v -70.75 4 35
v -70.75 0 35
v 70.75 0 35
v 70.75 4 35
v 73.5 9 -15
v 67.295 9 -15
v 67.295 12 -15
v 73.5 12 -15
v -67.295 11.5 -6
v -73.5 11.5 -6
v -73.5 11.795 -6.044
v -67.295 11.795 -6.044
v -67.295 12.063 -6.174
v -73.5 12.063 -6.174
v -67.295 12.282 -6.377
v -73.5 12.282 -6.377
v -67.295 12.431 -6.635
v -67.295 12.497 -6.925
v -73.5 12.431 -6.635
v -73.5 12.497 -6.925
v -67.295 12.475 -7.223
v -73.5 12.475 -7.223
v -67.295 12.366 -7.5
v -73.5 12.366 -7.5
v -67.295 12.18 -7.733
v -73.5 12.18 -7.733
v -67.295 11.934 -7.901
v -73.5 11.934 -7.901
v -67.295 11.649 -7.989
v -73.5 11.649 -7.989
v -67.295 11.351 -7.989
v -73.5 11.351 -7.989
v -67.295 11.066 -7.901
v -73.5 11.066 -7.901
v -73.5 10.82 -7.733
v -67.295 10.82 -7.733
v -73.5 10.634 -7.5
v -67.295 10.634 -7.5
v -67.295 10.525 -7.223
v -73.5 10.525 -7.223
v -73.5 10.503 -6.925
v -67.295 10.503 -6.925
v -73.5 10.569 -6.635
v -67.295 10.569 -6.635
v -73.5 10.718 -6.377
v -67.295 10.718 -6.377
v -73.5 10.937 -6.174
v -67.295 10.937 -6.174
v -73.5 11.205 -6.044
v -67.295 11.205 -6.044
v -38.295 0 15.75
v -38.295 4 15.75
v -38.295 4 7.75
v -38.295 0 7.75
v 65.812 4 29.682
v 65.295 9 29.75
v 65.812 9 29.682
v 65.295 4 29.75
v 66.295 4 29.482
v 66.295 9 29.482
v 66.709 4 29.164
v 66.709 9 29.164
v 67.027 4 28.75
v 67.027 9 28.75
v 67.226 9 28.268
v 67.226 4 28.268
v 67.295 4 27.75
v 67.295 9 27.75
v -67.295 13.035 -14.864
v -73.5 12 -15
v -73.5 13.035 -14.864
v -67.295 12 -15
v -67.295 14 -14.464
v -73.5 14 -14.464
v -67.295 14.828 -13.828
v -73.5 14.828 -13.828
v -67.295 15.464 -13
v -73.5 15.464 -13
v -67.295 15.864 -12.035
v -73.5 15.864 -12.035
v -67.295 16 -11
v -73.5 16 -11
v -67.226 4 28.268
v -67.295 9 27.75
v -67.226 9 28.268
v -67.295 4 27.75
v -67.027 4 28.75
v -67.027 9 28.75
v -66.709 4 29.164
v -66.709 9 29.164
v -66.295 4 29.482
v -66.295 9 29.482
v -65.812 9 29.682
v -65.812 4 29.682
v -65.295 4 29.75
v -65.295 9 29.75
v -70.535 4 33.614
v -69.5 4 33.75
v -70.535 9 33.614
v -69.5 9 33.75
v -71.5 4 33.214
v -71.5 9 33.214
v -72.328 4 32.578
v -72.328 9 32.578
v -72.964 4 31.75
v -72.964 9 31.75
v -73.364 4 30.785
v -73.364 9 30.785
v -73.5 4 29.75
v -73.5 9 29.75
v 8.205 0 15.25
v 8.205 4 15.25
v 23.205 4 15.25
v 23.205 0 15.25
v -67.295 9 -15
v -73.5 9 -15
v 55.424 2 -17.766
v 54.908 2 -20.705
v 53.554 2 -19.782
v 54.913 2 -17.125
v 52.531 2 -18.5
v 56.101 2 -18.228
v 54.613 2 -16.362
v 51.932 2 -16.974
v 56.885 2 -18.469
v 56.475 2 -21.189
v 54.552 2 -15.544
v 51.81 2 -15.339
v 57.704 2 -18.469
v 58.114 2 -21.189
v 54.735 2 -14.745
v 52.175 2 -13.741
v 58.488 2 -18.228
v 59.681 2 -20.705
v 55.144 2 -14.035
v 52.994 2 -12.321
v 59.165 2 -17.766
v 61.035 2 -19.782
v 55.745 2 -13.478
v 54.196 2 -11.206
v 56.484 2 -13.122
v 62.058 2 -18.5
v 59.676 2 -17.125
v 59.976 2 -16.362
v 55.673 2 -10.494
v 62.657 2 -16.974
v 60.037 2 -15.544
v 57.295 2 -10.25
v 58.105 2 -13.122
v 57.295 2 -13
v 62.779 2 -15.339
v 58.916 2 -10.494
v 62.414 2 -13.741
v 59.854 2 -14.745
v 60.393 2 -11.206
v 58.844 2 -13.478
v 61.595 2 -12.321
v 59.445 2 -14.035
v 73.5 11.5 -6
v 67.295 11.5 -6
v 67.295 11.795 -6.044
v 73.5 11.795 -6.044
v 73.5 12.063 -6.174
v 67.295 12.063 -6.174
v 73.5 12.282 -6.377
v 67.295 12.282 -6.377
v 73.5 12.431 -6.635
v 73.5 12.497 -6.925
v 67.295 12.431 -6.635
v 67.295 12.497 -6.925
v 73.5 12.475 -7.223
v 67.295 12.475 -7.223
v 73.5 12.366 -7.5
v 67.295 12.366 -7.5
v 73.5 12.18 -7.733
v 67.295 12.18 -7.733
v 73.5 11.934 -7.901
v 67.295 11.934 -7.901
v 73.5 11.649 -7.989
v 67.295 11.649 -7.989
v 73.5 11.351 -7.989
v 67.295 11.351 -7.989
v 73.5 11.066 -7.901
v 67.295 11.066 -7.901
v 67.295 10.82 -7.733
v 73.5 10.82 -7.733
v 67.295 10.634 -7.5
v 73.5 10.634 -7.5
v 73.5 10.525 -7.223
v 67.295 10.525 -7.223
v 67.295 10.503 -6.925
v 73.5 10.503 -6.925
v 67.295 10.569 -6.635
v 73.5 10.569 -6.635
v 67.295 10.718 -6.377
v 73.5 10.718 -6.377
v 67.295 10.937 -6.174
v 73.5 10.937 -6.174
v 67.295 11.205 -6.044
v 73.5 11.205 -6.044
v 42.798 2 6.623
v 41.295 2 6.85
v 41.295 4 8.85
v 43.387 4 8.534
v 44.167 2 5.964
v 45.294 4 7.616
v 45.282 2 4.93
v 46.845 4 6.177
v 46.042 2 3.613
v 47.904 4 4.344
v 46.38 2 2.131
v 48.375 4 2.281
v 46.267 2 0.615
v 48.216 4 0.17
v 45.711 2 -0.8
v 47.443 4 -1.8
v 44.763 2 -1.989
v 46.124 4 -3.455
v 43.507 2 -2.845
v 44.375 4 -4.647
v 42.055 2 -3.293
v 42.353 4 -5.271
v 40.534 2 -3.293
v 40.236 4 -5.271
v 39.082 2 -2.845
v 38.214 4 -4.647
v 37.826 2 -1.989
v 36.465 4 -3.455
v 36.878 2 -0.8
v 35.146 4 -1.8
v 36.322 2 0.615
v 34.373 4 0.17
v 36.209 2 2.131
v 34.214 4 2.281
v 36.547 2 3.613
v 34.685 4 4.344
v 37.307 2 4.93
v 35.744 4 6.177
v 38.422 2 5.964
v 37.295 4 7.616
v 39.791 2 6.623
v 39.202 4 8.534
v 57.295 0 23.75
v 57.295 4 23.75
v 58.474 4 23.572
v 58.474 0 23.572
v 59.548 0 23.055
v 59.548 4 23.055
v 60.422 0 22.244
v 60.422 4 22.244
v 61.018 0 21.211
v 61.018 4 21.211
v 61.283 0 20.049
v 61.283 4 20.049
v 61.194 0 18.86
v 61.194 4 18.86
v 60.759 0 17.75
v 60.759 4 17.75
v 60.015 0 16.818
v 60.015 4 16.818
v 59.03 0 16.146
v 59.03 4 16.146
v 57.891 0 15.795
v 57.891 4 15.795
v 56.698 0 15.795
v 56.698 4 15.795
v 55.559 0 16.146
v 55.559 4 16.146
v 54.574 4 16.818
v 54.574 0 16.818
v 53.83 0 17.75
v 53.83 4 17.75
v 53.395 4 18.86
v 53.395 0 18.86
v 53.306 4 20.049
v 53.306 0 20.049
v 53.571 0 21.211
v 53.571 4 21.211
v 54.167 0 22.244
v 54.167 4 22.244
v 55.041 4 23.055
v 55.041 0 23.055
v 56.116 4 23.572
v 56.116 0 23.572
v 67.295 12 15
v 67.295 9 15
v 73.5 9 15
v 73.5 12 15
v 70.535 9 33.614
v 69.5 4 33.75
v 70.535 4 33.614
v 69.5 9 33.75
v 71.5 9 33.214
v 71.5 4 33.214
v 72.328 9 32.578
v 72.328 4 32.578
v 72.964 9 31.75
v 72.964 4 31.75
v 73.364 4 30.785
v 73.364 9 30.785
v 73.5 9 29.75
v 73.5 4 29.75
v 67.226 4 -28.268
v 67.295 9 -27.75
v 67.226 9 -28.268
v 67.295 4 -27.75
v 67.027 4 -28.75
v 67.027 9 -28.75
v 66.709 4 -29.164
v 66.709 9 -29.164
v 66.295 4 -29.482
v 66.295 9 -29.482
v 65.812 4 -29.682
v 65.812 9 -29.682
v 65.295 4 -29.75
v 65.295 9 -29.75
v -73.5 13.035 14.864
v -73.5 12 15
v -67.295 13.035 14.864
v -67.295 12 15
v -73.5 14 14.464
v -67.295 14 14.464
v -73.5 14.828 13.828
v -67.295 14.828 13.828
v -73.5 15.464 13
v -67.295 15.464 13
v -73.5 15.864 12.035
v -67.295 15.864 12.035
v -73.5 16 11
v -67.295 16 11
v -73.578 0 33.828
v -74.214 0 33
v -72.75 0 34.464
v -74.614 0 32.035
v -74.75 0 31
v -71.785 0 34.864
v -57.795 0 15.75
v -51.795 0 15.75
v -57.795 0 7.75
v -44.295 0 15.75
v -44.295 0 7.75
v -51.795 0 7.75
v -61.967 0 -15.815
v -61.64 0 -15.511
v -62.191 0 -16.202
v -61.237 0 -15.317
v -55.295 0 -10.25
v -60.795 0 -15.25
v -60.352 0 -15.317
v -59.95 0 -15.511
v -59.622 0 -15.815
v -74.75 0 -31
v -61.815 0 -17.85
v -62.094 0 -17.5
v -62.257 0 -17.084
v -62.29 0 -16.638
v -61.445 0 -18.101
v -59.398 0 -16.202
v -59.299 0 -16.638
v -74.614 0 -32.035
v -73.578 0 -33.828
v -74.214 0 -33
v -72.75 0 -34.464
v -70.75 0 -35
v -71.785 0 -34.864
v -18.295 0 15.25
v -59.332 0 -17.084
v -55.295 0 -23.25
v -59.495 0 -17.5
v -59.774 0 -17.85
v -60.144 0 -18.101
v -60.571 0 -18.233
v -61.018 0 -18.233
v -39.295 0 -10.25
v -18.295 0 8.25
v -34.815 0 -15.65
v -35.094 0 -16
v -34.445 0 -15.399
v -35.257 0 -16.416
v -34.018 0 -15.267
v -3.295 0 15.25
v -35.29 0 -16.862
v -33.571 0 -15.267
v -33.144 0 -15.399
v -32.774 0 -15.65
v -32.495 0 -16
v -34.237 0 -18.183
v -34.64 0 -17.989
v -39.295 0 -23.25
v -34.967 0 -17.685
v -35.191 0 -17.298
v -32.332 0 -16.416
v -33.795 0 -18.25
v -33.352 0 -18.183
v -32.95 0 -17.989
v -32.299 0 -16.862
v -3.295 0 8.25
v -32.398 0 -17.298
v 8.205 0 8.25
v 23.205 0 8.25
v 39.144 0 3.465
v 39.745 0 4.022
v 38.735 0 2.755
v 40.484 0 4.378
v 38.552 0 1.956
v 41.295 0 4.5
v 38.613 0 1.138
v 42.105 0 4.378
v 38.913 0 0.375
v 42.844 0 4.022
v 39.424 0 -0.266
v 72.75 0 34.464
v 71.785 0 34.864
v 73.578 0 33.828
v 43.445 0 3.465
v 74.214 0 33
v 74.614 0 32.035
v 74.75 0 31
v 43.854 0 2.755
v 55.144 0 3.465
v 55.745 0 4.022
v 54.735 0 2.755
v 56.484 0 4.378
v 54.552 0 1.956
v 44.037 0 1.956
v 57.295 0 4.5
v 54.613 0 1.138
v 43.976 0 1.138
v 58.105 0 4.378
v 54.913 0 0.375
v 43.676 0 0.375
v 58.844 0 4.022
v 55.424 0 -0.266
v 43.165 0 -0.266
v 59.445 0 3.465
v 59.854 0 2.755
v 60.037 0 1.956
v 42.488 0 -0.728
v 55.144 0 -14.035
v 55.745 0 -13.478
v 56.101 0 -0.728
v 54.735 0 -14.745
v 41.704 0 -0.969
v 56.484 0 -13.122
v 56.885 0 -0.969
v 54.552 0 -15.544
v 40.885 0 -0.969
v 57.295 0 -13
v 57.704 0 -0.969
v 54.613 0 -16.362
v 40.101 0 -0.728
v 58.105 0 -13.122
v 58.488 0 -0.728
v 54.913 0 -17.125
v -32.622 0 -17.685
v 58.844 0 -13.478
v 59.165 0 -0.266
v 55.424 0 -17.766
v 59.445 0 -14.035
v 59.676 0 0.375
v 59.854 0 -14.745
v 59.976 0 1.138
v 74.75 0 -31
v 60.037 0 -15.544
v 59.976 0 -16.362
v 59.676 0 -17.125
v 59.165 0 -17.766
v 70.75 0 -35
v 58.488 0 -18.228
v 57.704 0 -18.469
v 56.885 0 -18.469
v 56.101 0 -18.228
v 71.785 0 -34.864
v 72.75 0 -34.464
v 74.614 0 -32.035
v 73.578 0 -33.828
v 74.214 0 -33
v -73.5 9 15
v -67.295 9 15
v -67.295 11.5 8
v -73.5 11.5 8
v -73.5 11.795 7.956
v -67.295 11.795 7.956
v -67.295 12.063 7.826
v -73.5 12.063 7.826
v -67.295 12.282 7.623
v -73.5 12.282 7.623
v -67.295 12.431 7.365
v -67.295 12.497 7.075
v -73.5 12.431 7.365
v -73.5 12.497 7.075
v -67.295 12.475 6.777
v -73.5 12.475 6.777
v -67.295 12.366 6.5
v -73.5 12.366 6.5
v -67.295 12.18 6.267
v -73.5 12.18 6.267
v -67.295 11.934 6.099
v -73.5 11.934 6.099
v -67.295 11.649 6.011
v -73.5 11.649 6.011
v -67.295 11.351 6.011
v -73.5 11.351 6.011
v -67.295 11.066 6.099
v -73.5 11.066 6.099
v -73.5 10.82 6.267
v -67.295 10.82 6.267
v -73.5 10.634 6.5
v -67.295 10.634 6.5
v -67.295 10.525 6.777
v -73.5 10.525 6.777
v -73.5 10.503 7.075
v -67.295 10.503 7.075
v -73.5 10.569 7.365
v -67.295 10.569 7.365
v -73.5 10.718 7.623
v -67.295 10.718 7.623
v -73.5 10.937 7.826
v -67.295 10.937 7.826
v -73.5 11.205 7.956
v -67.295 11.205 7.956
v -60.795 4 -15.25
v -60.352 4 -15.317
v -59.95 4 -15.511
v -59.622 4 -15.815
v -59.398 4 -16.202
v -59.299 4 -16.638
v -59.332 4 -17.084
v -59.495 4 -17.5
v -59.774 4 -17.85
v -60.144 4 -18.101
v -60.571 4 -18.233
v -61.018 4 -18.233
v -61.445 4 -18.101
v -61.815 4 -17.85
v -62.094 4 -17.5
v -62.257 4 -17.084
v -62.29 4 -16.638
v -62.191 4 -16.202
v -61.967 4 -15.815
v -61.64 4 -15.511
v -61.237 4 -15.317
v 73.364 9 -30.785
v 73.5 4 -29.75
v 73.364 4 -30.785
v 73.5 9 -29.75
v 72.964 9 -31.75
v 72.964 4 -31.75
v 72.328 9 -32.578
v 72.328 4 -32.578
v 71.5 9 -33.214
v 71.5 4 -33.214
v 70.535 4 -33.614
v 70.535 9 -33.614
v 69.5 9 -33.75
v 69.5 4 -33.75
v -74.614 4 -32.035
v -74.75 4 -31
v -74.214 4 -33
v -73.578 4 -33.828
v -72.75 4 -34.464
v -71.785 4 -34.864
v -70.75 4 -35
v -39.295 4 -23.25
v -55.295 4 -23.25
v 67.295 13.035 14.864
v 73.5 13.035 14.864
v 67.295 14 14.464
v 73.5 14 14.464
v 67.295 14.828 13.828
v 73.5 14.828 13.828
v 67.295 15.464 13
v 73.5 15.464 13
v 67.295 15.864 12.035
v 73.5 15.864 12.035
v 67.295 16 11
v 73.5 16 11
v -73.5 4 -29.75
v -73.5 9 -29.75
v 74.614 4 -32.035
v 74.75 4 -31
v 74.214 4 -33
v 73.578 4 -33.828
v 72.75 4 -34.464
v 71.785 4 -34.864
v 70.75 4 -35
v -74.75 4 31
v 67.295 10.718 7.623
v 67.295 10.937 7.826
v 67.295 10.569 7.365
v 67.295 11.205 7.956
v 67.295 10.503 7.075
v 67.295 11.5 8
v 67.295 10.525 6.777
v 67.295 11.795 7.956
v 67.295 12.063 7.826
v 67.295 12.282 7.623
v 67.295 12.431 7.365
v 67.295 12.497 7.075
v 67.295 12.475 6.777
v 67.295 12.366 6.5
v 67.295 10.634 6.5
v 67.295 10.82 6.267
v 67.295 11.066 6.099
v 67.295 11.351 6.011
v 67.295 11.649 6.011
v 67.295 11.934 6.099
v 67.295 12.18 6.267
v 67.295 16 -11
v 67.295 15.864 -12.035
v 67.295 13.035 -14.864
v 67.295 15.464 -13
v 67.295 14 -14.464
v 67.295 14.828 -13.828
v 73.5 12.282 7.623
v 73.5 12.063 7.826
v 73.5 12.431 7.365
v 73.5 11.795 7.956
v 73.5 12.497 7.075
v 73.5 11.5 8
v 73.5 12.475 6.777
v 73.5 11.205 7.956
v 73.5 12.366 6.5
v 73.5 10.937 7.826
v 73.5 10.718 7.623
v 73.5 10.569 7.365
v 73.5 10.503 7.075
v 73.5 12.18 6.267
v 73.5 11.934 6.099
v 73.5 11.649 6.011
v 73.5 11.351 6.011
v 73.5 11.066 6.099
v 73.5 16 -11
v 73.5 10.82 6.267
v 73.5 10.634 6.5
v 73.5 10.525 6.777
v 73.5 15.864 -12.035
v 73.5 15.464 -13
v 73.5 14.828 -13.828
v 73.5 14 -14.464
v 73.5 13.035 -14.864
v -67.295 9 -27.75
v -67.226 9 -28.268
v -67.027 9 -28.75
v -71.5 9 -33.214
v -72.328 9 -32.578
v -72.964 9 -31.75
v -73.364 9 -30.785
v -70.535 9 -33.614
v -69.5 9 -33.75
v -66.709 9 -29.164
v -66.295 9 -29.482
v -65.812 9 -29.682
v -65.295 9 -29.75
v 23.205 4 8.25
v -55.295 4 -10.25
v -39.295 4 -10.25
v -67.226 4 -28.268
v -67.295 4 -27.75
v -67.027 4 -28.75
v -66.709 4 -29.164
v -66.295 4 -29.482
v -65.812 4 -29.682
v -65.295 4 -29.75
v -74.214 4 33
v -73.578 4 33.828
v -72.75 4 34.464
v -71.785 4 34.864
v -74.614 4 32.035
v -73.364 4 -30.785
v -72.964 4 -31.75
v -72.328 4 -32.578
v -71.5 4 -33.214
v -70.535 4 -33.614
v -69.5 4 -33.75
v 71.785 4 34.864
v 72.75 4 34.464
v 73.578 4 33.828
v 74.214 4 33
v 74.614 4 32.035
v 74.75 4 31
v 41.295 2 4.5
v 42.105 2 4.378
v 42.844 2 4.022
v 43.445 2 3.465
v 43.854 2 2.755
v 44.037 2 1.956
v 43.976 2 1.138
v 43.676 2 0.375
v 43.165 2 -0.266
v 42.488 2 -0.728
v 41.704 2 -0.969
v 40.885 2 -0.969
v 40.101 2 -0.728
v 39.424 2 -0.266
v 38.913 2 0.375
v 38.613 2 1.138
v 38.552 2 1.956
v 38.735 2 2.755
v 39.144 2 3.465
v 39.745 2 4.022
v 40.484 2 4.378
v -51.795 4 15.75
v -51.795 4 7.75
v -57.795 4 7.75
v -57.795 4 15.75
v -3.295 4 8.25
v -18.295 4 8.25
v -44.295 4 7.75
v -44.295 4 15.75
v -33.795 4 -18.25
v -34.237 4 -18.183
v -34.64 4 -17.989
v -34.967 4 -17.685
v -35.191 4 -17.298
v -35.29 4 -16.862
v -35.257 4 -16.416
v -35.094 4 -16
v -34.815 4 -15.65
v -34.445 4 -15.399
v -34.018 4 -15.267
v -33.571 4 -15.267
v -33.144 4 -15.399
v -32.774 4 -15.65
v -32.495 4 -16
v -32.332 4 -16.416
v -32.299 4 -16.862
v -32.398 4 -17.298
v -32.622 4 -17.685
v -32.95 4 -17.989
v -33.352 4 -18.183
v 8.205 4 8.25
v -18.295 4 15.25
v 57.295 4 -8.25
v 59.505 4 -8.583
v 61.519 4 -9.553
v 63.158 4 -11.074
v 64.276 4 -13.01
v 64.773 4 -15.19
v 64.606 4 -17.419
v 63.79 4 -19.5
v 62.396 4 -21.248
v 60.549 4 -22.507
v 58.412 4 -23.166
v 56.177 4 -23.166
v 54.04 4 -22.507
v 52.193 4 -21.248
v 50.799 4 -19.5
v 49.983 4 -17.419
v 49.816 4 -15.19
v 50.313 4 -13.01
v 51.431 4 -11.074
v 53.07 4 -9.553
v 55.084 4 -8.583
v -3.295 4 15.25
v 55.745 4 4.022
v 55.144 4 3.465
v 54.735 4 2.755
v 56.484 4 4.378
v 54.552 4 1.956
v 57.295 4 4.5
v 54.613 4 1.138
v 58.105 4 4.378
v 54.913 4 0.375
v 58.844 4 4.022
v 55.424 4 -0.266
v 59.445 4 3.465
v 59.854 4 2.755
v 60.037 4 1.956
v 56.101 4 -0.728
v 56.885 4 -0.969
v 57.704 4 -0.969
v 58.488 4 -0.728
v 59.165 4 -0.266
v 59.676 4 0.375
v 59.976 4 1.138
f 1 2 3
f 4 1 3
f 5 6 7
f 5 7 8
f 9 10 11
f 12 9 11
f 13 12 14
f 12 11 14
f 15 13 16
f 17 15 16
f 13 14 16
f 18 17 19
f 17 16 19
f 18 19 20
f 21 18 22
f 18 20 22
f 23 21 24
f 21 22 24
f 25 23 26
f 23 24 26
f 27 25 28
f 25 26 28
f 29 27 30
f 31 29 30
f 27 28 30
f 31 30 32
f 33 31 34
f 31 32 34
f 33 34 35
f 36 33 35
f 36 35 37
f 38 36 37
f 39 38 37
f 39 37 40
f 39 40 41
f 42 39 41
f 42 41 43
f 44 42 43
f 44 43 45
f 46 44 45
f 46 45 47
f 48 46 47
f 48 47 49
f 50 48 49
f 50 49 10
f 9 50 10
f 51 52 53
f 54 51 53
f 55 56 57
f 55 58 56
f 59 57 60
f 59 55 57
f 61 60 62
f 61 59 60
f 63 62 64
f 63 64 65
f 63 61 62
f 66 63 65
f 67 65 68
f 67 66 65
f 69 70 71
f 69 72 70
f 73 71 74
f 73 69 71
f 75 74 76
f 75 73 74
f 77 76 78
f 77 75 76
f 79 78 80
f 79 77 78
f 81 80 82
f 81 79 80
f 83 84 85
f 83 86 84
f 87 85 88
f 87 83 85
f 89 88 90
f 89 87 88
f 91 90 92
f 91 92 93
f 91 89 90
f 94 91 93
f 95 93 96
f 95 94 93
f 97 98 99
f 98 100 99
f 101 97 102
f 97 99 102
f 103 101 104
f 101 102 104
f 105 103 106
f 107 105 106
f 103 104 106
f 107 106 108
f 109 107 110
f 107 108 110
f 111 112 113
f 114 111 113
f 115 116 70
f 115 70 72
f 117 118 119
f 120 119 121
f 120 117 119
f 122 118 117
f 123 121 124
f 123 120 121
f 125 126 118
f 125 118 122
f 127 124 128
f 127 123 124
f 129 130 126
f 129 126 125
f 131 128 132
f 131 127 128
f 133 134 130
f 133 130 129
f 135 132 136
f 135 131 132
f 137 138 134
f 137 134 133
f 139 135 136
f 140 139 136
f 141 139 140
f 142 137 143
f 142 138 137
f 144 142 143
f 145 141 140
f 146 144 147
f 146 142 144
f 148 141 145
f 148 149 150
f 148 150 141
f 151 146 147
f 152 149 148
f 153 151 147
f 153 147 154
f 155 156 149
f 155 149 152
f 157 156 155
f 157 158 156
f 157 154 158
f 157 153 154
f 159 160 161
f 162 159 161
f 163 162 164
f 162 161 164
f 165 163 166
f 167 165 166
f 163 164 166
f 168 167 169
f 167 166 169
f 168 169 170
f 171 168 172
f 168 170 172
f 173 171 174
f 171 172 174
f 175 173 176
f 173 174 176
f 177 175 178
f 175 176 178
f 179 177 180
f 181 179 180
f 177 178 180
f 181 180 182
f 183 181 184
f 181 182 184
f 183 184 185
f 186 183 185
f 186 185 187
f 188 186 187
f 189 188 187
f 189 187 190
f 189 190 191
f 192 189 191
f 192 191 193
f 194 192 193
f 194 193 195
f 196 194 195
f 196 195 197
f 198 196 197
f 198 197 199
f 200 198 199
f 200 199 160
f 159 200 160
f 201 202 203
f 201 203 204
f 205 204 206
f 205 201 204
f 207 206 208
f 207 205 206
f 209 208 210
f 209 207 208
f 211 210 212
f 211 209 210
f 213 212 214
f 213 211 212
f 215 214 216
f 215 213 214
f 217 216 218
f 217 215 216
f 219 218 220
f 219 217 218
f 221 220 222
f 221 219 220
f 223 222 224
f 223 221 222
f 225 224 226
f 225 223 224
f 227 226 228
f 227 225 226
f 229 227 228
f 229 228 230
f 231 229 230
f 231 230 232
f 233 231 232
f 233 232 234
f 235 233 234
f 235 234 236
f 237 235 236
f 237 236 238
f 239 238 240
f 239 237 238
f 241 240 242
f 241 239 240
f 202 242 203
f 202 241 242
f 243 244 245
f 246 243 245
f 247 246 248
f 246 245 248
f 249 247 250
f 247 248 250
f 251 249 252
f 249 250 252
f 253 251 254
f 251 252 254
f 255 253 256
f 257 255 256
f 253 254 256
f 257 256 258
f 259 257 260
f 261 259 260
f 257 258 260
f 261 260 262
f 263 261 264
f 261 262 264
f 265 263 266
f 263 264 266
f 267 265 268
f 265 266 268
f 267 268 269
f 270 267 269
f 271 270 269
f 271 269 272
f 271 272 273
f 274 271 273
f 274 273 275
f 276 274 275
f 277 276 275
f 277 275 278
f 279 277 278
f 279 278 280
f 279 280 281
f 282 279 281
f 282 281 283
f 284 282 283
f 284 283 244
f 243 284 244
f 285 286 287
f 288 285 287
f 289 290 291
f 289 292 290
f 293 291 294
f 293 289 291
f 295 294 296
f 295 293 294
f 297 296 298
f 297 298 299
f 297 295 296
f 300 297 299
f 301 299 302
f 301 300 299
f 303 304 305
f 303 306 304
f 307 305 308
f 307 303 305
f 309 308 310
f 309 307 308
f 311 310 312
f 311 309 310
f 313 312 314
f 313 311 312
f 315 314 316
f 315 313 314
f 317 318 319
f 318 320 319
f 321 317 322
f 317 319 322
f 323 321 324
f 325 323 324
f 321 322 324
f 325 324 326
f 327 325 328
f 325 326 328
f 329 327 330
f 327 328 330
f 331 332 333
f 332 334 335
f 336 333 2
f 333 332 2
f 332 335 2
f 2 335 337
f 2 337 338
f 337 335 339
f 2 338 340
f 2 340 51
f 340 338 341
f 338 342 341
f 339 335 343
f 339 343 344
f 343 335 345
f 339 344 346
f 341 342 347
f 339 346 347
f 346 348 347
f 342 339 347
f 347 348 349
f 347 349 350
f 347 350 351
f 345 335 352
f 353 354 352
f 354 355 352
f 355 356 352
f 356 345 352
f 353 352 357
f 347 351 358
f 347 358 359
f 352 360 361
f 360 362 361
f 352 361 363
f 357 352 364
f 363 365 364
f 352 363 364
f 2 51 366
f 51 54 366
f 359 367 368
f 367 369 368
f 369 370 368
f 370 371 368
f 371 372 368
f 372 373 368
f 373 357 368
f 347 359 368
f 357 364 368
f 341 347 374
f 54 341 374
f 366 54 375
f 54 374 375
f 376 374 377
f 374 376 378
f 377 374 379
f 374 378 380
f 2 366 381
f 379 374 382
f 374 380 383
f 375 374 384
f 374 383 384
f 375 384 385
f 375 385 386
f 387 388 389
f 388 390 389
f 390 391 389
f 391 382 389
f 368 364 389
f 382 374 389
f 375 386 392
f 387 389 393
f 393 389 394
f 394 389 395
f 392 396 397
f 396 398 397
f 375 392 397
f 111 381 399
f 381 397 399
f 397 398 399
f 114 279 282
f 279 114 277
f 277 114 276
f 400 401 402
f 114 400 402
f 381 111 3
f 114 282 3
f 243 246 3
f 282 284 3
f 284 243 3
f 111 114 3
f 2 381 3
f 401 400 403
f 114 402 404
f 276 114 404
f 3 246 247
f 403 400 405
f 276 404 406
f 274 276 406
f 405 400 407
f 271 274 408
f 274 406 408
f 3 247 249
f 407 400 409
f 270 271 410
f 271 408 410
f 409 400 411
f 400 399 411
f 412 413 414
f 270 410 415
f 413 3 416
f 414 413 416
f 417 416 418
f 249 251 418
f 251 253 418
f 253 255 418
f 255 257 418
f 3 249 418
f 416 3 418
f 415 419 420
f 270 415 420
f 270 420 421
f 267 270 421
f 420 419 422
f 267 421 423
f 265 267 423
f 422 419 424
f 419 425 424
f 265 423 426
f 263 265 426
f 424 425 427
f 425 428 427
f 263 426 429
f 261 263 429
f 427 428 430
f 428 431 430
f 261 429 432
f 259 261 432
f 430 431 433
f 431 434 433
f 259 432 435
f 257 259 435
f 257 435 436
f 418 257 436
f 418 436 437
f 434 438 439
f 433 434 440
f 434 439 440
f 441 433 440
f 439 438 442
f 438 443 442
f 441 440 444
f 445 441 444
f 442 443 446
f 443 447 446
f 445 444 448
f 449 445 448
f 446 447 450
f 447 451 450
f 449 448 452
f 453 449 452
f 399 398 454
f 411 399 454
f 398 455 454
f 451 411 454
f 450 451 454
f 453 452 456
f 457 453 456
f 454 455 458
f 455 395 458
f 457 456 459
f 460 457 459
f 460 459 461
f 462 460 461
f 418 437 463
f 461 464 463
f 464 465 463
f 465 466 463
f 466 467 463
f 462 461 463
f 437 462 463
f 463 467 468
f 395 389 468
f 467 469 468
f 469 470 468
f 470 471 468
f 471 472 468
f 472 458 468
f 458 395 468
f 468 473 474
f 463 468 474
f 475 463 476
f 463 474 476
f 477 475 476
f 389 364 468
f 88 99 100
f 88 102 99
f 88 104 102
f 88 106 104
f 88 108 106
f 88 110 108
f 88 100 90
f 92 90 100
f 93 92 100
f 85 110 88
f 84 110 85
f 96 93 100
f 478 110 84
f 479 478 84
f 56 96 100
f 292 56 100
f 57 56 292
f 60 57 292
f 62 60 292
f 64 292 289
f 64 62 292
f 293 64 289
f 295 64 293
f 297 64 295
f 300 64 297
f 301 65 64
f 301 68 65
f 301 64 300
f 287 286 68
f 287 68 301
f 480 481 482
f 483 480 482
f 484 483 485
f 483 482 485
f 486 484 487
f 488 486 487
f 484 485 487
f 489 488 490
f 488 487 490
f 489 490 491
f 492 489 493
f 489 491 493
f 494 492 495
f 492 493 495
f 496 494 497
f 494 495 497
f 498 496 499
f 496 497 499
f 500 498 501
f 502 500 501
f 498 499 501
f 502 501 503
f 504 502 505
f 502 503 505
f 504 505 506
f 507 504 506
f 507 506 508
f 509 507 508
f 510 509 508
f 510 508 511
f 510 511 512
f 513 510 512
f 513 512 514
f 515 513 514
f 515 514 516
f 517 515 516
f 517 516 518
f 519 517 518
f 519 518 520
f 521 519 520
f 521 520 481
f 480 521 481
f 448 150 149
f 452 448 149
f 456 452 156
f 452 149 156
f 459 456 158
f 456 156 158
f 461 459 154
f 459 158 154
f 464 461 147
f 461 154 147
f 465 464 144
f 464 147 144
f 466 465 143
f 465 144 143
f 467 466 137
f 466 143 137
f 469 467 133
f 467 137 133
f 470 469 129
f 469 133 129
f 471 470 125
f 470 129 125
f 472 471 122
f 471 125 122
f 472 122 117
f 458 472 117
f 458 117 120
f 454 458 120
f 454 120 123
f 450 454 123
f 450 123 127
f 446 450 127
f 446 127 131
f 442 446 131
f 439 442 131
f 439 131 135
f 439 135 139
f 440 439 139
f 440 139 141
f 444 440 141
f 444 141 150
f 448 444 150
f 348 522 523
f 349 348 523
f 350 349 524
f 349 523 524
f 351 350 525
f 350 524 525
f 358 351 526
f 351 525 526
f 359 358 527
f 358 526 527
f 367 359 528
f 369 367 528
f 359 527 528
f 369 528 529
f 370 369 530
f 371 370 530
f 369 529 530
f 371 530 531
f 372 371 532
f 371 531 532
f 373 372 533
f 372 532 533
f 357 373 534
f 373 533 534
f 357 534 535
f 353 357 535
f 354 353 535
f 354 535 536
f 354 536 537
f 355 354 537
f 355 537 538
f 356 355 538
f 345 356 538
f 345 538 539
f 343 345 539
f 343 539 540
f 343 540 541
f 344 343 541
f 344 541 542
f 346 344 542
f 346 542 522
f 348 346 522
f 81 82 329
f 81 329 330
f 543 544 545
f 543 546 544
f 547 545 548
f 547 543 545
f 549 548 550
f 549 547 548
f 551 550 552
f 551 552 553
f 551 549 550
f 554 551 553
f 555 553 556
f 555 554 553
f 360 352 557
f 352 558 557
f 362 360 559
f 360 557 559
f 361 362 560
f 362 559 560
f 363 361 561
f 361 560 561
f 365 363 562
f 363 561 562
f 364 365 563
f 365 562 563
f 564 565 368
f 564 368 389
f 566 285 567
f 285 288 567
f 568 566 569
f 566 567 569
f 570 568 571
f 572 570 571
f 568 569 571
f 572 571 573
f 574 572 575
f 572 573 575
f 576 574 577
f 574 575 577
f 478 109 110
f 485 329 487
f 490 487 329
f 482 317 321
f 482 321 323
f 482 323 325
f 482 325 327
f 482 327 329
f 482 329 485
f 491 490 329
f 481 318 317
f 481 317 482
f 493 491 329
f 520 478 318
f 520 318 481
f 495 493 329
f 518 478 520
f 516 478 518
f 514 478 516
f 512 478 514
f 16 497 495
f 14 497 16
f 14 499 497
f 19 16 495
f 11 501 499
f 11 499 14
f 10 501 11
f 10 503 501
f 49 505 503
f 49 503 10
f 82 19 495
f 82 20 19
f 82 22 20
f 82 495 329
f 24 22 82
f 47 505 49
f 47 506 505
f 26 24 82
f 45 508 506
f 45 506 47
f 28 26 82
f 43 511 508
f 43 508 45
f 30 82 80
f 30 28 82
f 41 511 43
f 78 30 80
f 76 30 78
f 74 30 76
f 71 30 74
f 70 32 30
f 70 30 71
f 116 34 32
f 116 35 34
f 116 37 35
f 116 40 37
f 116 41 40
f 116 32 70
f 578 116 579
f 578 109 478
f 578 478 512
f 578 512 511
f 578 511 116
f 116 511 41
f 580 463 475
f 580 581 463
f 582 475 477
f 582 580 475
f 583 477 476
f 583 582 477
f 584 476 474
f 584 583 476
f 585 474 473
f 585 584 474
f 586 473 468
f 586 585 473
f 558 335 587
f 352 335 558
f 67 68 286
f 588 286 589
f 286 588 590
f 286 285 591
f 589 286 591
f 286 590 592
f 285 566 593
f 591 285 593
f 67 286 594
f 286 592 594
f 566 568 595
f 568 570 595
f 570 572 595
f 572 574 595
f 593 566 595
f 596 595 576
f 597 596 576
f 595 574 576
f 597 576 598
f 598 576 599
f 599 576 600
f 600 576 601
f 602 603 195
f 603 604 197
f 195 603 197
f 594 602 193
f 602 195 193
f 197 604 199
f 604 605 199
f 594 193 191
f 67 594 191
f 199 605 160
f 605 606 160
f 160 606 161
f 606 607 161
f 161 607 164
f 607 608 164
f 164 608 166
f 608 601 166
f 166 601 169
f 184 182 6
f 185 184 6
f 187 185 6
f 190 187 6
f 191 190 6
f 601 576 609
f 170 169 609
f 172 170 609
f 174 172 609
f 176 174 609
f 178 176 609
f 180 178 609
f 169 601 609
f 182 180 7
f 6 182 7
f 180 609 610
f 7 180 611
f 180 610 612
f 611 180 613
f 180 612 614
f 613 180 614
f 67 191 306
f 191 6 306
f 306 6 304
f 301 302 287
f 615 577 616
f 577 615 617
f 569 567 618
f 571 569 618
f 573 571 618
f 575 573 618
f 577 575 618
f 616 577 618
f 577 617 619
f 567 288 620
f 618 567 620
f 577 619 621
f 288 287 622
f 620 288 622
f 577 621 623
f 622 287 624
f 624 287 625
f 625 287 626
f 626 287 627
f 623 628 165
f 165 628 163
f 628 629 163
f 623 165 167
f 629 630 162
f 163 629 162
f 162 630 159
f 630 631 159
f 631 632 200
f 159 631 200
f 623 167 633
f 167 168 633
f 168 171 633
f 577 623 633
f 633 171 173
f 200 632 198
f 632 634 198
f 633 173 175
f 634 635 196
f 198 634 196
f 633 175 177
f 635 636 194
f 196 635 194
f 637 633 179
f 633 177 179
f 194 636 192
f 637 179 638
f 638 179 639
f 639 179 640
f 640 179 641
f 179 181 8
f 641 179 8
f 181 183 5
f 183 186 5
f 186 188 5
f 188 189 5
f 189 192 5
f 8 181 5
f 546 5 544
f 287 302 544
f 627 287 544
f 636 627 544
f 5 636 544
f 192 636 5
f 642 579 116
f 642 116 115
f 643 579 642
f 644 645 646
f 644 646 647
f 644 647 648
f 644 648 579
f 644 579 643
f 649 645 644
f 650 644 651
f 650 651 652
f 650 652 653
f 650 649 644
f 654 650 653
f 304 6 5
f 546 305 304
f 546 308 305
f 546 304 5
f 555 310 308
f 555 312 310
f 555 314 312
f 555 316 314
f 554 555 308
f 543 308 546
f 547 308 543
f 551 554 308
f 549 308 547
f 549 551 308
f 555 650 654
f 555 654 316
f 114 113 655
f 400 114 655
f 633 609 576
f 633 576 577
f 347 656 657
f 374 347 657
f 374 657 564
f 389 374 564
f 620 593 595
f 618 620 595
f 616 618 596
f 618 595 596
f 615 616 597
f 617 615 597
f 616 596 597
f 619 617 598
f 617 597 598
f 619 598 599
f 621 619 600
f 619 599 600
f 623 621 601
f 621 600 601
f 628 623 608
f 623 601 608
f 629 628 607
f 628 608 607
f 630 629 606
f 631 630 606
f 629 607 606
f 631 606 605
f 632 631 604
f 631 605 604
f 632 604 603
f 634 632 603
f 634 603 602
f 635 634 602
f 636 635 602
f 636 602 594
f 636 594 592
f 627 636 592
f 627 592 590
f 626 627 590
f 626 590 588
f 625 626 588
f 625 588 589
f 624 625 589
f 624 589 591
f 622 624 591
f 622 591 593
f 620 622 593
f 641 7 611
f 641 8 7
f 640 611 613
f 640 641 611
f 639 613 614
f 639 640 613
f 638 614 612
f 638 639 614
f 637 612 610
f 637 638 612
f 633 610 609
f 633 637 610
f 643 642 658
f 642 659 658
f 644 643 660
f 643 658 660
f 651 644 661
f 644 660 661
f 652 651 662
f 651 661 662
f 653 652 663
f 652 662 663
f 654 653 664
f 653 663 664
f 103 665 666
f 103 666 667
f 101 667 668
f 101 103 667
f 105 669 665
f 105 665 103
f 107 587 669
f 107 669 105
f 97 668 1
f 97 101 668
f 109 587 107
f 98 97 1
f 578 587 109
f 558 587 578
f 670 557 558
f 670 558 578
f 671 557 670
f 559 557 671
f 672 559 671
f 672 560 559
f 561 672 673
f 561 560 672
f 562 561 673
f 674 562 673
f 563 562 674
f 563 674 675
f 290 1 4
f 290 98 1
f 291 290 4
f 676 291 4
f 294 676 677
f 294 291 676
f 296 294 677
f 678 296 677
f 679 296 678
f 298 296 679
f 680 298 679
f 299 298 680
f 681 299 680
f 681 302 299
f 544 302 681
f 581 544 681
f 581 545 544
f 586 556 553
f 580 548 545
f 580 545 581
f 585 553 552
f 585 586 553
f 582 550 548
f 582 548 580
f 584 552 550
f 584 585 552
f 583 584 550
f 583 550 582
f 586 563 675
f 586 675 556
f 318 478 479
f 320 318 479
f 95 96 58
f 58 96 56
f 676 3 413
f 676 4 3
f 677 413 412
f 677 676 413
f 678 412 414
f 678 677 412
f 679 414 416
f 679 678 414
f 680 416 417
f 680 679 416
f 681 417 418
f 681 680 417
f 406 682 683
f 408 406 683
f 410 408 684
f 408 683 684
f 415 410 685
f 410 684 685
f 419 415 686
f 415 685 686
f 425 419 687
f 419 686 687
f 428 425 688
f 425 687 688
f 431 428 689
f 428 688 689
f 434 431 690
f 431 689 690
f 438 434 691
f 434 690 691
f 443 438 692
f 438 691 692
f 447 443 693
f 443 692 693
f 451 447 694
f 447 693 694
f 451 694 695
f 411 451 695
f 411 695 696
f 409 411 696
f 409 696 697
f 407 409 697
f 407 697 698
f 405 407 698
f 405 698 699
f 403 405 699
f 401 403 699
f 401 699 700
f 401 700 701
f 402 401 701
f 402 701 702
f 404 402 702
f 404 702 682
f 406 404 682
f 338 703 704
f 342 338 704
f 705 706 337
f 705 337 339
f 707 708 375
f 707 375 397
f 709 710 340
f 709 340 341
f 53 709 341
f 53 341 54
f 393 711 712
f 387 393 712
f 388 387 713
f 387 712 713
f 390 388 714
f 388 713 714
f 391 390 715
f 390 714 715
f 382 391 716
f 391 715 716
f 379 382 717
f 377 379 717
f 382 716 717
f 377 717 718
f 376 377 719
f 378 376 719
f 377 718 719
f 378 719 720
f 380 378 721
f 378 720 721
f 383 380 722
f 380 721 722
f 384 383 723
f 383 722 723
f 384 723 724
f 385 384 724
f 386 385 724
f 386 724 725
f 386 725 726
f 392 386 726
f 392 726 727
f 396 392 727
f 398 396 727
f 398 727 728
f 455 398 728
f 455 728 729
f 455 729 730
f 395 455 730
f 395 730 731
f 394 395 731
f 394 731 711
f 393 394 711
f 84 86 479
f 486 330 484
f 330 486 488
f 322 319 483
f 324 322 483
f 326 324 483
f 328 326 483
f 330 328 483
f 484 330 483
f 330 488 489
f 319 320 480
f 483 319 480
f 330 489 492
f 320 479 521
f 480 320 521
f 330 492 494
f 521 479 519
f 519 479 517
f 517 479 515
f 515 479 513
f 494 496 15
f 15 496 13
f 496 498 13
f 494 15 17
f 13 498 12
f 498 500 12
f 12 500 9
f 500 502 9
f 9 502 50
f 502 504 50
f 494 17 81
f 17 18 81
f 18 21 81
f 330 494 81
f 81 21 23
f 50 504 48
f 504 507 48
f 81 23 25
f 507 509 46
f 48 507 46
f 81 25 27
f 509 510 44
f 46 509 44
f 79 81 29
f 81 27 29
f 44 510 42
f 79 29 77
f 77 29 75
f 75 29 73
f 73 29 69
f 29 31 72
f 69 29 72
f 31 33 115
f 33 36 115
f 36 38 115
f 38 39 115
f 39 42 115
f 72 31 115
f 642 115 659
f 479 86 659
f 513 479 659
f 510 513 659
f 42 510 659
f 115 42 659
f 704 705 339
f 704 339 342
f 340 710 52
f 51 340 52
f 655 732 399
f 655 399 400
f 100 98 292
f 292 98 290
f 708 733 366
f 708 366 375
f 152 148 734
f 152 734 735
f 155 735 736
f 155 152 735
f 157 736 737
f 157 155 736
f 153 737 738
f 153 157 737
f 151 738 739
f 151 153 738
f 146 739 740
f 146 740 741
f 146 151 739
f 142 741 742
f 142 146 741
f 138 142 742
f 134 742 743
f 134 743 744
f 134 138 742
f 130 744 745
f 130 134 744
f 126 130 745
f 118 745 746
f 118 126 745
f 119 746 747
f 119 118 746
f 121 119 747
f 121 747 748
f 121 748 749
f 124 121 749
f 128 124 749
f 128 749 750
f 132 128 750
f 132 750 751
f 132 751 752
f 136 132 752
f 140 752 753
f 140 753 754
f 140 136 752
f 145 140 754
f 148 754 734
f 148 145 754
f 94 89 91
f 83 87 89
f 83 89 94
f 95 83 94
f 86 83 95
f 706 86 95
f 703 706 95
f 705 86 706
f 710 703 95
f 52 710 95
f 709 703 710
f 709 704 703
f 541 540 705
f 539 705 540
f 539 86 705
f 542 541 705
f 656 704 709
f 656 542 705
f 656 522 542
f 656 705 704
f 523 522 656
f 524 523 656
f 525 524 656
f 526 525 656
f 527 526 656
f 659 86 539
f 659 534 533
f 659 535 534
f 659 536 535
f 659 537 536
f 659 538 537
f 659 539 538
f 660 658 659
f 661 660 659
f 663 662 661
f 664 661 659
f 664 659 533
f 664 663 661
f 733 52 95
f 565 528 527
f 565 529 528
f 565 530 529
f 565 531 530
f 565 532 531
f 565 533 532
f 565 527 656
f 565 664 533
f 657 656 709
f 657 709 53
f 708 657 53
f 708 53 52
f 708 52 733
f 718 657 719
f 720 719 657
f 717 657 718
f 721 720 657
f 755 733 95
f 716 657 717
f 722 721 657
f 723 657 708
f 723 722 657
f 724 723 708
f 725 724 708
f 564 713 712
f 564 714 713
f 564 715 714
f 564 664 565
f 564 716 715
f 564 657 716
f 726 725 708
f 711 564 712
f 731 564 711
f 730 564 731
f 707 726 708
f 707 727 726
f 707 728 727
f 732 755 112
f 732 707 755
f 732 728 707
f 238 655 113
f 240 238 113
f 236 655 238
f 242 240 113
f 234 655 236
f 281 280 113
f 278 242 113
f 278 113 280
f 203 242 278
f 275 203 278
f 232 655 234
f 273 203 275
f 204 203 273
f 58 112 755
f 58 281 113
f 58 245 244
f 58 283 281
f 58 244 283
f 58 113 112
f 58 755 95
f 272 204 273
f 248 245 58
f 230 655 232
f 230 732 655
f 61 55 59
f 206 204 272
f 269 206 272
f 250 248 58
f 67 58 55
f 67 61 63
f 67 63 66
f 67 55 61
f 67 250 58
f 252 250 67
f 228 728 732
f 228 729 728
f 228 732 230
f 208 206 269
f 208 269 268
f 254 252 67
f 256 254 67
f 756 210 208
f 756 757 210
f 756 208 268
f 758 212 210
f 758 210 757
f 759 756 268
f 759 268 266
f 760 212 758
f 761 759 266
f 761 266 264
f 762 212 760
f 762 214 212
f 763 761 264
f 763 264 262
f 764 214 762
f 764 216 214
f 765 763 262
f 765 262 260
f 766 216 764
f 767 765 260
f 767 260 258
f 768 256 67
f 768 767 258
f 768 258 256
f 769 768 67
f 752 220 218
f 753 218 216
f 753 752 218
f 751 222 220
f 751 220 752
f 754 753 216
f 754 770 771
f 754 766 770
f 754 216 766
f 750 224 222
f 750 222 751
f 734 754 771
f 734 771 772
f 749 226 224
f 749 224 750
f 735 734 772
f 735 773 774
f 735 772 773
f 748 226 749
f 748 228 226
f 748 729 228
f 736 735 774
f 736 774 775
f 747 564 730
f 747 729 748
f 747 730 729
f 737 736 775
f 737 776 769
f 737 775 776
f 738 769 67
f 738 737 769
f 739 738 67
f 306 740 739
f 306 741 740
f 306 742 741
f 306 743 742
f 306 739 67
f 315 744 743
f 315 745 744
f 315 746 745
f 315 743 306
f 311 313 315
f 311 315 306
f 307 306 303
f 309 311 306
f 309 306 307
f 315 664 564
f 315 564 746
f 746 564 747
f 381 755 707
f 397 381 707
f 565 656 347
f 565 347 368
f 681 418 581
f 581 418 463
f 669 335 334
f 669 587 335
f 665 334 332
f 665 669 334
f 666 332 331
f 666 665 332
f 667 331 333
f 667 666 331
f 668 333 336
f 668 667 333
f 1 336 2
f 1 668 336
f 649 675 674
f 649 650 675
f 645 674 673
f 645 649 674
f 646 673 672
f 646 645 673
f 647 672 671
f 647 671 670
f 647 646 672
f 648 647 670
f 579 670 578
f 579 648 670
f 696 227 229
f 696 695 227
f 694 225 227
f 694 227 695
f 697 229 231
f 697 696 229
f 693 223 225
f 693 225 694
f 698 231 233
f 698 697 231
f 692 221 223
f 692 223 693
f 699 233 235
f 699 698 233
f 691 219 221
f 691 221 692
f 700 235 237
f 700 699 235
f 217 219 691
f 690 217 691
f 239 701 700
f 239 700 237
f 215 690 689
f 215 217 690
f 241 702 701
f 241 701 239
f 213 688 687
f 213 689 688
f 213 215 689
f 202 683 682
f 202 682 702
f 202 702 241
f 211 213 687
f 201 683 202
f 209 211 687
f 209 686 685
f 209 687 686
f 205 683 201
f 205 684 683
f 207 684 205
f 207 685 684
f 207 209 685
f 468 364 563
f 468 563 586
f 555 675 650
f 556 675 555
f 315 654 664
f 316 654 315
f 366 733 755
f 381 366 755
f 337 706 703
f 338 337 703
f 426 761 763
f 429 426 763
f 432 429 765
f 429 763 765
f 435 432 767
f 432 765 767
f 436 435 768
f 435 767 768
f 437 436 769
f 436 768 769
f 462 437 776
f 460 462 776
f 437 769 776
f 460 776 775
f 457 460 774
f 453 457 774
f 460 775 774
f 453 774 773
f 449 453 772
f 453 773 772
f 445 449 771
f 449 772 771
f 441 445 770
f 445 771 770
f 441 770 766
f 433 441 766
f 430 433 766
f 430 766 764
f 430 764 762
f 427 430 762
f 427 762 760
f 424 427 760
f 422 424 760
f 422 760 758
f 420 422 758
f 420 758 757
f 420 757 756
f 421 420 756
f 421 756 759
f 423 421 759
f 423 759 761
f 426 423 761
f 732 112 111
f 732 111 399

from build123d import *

# Parameters (mm, degrees)
SKETCH1_W           = 149.5
SKETCH1_H           = 70
BOSS_EXTRUDE1_DEPTH = 4
FILLET1_R           = 4
SKETCH6_W           = 147
SKETCH6_H           = 67.5
BOSS_EXTRUDE3_DEPTH = 5
FILLET2_R           = 4
SKETCH7_W           = 6.205469591
SKETCH7_H           = 30
BOSS_EXTRUDE4_DEPTH = 7
SKETCH8_R           = 1
CUT_EXTRUDE3_DEPTH  = 154.163515564
FILLET5_R           = 4
SKETCH9_W           = 134.589060818
SKETCH9_H           = 59.5
CUT_EXTRUDE4_DEPTH  = 5
FILLET7_R           = 2
SKETCH11_R          = 4
CUT_EXTRUDE5_DEPTH  = 84.406009975
SKETCH12_R          = 2.75
CUT_EXTRUDE6_DEPTH  = 84.406009975
SKETCH13_R          = 2.75
CUT_EXTRUDE7_DEPTH  = 84.406009975
SKETCH17_W          = 16
SKETCH17_H          = 13
CUT_EXTRUDE11_DEPTH = 84.406009975
SKETCH18_R          = 3
SKETCH18_W          = 15
SKETCH18_H          = 7
CUT_EXTRUDE12_DEPTH = 84.406009975
SKETCH19_W          = 6
SKETCH19_H          = 8
CUT_EXTRUDE13_DEPTH = 84.406009975
SKETCH20_R          = 1.5
CUT_EXTRUDE14_DEPTH = 84.406009975
SKETCH22_R          = 5.5
CUT_EXTRUDE15_DEPTH = 2
CHAMFER2_SIZE       = 2
SKETCH23_R          = 2.75
CUT_EXTRUDE16_DEPTH = 84.406009975
SKETCH24_R          = 5.1
CUT_EXTRUDE17_DEPTH = 2
CHAMFER3_SIZE       = 2


with BuildPart() as part:
    # Sketch1 → Boss-Extrude1 (new body)
    with BuildSketch(Plane(origin=(0, 0, 0), x_dir=(1, 0, 0), z_dir=(0, 1, 0))):
        Rectangle(SKETCH1_W, SKETCH1_H)
    extrude(amount=BOSS_EXTRUDE1_DEPTH)

    # Fillet1
    fillet1_edges = [part.edges().sort_by_distance(p)[0] for p in [
        (74.75, 2, 35),
        (-74.75, 2, 35),
        (-74.75, 2, -35),
        (74.75, 2, -35),
    ]]
    fillet(fillet1_edges, radius=FILLET1_R)

    # Sketch6 → Boss-Extrude3 (add)
    with BuildSketch(Plane(origin=(0, 4, 0), x_dir=(1, 0, 0), z_dir=(0, 1, 0))):
        Rectangle(SKETCH6_W, SKETCH6_H)
    extrude(amount=BOSS_EXTRUDE3_DEPTH)

    # Fillet2
    fillet2_edges = [part.edges().sort_by_distance(p)[0] for p in [
        (73.5, 6.5, 33.75),
        (73.5, 6.5, -33.75),
        (-73.5, 6.5, -33.75),
        (-73.5, 6.5, 33.75),
    ]]
    fillet(fillet2_edges, radius=FILLET2_R)

    # Sketch7 → Boss-Extrude4 (add)
    with BuildSketch(Plane(origin=(0, 9, 0), x_dir=(1, 0, 0), z_dir=(0, 1, 0))):
        with Locations((-70.397265205, 0)):
            Rectangle(SKETCH7_W, SKETCH7_H)
        with Locations((70.397265205, 0)):
            Rectangle(SKETCH7_W, SKETCH7_H)
    extrude(amount=BOSS_EXTRUDE4_DEPTH)

    # Sketch8 → Cut-Extrude3 (cut, through all)
    with BuildSketch(Plane.ZY.offset(73.5)):
        with Locations((-7, 11.5)):
            Circle(SKETCH8_R)
        with Locations((7, 11.5)):
            Circle(SKETCH8_R)
    extrude(amount=-CUT_EXTRUDE3_DEPTH, mode=Mode.SUBTRACT)

    # Fillet5
    fillet5_edges = [part.edges().sort_by_distance(p)[0] for p in [
        (-70.397265204, 16, 15),
        (-70.397265204, 16, -15),
        (70.397265204, 16, -15),
        (70.397265204, 16, 15),
    ]]
    fillet(fillet5_edges, radius=FILLET5_R)

    # Sketch9 → Cut-Extrude4 (cut)
    with BuildSketch(Plane(origin=(0, 9, 0), x_dir=(1, 0, 0), z_dir=(0, 1, 0))):
        Rectangle(SKETCH9_W, SKETCH9_H)
    extrude(amount=-CUT_EXTRUDE4_DEPTH, mode=Mode.SUBTRACT)

    # Fillet7
    fillet7_edges = [part.edges().sort_by_distance(p)[0] for p in [
        (67.294530409, 6.5, -29.75),
        (67.294530409, 6.5, 29.75),
        (-67.294530409, 6.5, 29.75),
        (-67.294530409, 6.5, -29.75),
    ]]
    fillet(fillet7_edges, radius=FILLET7_R)

    # Sketch11 → Cut-Extrude5 (cut, through all)
    with BuildSketch(Plane(origin=(0, 4, 0), x_dir=(1, 0, 0), z_dir=(0, 1, 0))):
        with Locations(Location((57.294530409, -19.75, 0), (0, 0, 270))):
            Circle(SKETCH11_R)
    extrude(amount=-CUT_EXTRUDE5_DEPTH, mode=Mode.SUBTRACT)

    # Sketch12 → Cut-Extrude6 (cut, through all)
    with BuildSketch(Plane(origin=(0, 4, 0), x_dir=(1, 0, 0), z_dir=(0, 1, 0))):
        with Locations(Location((57.294530409, -1.75, 0), (0, 0, 270))):
            Circle(SKETCH12_R)
    extrude(amount=-CUT_EXTRUDE6_DEPTH, mode=Mode.SUBTRACT)

    # Sketch13 → Cut-Extrude7 (cut, through all)
    with BuildSketch(Plane(origin=(0, 4, 0), x_dir=(1, 0, 0), z_dir=(0, 1, 0))):
        with Locations(Location((57.294530409, 15.75, 0), (0, 0, 270))):
            Circle(SKETCH13_R)
    extrude(amount=-CUT_EXTRUDE7_DEPTH, mode=Mode.SUBTRACT)

    # Sketch17 → Cut-Extrude11 (cut, through all)
    with BuildSketch(Plane(origin=(0, 4, 0), x_dir=(1, 0, 0), z_dir=(0, 1, 0))):
        with Locations((-47.294530409, 16.75)):
            Rectangle(SKETCH17_W, SKETCH17_H)
    extrude(amount=-CUT_EXTRUDE11_DEPTH, mode=Mode.SUBTRACT)

    # Sketch18 → Cut-Extrude12 (cut, through all)
    with BuildSketch(Plane(origin=(0, 4, 0), x_dir=(1, 0, 0), z_dir=(0, 1, 0))):
        with Locations(Location((-41.294530409, -11.75, 0), (0, 0, 270))):
            Circle(SKETCH18_R)
        with Locations(Location((-54.794530409, -11.75, 0), (0, 0, 270))):
            Circle(SKETCH18_R)
        with Locations((15.705469591, -11.75)):
            Rectangle(SKETCH18_W, SKETCH18_H)
        with Locations((-10.794530409, -11.75)):
            Rectangle(SKETCH18_W, SKETCH18_H)
    extrude(amount=-CUT_EXTRUDE12_DEPTH, mode=Mode.SUBTRACT)

    # Sketch19 → Cut-Extrude13 (cut, through all)
    with BuildSketch(Plane(origin=(0, 4, 0), x_dir=(1, 0, 0), z_dir=(0, 1, 0))):
        with Locations((-41.294530409, -11.75)):
            Rectangle(SKETCH19_W, SKETCH19_H)
        with Locations((-54.794530409, -11.75)):
            Rectangle(SKETCH19_W, SKETCH19_H)
    extrude(amount=-CUT_EXTRUDE13_DEPTH, mode=Mode.SUBTRACT)

    # Sketch20 → Cut-Extrude14 (cut, through all)
    with BuildSketch(Plane(origin=(0, 4, 0), x_dir=(1, 0, 0), z_dir=(0, 1, 0))):
        with Locations(Location((-60.794530409, 16.75, 0), (0, 0, 270))):
            Circle(SKETCH20_R)
        with Locations(Location((-33.794530409, 16.75, 0), (0, 0, 90))):
            Circle(SKETCH20_R)
    extrude(amount=-CUT_EXTRUDE14_DEPTH, mode=Mode.SUBTRACT)

    # Sketch22 → Cut-Extrude15 (cut)
    with BuildSketch(Plane(origin=(0, 4, 0), x_dir=(1, 0, 0), z_dir=(0, 1, 0))):
        with Locations(Location((57.294530409, 15.75, 0), (0, 0, 270))):
            Circle(SKETCH22_R)
    extrude(amount=-CUT_EXTRUDE15_DEPTH, mode=Mode.SUBTRACT)

    # Chamfer2
    chamfer2_edges = [part.edges().sort_by_distance(p)[0] for p in [
        (57.294530409, 4, -21.25),
    ]]
    chamfer(chamfer2_edges, length=CHAMFER2_SIZE - 0.0001)  # a hair under: the kernel refuses the full size

    # Sketch23 → Cut-Extrude16 (cut, through all)
    with BuildSketch(Plane(origin=(0, 4, 0), x_dir=(1, 0, 0), z_dir=(0, 1, 0))):
        with Locations(Location((41.294530409, -1.75, 0), (0, 0, 270))):
            Circle(SKETCH23_R)
    extrude(amount=-CUT_EXTRUDE16_DEPTH, mode=Mode.SUBTRACT)

    # Sketch24 → Cut-Extrude17 (cut)
    with BuildSketch(Plane(origin=(0, 4, 0), x_dir=(1, 0, 0), z_dir=(0, 1, 0))):
        with Locations(Location((41.294530409, -1.75, 0), (0, 0, 270))):
            Circle(SKETCH24_R)
    extrude(amount=-CUT_EXTRUDE17_DEPTH, mode=Mode.SUBTRACT)

    # Chamfer3
    chamfer3_edges = [part.edges().sort_by_distance(p)[0] for p in [
        (41.294530409, 4, -3.35),
    ]]
    chamfer(chamfer3_edges, length=CHAMFER3_SIZE - 0.0001)  # a hair under: the kernel refuses the full size


solid = part.part
